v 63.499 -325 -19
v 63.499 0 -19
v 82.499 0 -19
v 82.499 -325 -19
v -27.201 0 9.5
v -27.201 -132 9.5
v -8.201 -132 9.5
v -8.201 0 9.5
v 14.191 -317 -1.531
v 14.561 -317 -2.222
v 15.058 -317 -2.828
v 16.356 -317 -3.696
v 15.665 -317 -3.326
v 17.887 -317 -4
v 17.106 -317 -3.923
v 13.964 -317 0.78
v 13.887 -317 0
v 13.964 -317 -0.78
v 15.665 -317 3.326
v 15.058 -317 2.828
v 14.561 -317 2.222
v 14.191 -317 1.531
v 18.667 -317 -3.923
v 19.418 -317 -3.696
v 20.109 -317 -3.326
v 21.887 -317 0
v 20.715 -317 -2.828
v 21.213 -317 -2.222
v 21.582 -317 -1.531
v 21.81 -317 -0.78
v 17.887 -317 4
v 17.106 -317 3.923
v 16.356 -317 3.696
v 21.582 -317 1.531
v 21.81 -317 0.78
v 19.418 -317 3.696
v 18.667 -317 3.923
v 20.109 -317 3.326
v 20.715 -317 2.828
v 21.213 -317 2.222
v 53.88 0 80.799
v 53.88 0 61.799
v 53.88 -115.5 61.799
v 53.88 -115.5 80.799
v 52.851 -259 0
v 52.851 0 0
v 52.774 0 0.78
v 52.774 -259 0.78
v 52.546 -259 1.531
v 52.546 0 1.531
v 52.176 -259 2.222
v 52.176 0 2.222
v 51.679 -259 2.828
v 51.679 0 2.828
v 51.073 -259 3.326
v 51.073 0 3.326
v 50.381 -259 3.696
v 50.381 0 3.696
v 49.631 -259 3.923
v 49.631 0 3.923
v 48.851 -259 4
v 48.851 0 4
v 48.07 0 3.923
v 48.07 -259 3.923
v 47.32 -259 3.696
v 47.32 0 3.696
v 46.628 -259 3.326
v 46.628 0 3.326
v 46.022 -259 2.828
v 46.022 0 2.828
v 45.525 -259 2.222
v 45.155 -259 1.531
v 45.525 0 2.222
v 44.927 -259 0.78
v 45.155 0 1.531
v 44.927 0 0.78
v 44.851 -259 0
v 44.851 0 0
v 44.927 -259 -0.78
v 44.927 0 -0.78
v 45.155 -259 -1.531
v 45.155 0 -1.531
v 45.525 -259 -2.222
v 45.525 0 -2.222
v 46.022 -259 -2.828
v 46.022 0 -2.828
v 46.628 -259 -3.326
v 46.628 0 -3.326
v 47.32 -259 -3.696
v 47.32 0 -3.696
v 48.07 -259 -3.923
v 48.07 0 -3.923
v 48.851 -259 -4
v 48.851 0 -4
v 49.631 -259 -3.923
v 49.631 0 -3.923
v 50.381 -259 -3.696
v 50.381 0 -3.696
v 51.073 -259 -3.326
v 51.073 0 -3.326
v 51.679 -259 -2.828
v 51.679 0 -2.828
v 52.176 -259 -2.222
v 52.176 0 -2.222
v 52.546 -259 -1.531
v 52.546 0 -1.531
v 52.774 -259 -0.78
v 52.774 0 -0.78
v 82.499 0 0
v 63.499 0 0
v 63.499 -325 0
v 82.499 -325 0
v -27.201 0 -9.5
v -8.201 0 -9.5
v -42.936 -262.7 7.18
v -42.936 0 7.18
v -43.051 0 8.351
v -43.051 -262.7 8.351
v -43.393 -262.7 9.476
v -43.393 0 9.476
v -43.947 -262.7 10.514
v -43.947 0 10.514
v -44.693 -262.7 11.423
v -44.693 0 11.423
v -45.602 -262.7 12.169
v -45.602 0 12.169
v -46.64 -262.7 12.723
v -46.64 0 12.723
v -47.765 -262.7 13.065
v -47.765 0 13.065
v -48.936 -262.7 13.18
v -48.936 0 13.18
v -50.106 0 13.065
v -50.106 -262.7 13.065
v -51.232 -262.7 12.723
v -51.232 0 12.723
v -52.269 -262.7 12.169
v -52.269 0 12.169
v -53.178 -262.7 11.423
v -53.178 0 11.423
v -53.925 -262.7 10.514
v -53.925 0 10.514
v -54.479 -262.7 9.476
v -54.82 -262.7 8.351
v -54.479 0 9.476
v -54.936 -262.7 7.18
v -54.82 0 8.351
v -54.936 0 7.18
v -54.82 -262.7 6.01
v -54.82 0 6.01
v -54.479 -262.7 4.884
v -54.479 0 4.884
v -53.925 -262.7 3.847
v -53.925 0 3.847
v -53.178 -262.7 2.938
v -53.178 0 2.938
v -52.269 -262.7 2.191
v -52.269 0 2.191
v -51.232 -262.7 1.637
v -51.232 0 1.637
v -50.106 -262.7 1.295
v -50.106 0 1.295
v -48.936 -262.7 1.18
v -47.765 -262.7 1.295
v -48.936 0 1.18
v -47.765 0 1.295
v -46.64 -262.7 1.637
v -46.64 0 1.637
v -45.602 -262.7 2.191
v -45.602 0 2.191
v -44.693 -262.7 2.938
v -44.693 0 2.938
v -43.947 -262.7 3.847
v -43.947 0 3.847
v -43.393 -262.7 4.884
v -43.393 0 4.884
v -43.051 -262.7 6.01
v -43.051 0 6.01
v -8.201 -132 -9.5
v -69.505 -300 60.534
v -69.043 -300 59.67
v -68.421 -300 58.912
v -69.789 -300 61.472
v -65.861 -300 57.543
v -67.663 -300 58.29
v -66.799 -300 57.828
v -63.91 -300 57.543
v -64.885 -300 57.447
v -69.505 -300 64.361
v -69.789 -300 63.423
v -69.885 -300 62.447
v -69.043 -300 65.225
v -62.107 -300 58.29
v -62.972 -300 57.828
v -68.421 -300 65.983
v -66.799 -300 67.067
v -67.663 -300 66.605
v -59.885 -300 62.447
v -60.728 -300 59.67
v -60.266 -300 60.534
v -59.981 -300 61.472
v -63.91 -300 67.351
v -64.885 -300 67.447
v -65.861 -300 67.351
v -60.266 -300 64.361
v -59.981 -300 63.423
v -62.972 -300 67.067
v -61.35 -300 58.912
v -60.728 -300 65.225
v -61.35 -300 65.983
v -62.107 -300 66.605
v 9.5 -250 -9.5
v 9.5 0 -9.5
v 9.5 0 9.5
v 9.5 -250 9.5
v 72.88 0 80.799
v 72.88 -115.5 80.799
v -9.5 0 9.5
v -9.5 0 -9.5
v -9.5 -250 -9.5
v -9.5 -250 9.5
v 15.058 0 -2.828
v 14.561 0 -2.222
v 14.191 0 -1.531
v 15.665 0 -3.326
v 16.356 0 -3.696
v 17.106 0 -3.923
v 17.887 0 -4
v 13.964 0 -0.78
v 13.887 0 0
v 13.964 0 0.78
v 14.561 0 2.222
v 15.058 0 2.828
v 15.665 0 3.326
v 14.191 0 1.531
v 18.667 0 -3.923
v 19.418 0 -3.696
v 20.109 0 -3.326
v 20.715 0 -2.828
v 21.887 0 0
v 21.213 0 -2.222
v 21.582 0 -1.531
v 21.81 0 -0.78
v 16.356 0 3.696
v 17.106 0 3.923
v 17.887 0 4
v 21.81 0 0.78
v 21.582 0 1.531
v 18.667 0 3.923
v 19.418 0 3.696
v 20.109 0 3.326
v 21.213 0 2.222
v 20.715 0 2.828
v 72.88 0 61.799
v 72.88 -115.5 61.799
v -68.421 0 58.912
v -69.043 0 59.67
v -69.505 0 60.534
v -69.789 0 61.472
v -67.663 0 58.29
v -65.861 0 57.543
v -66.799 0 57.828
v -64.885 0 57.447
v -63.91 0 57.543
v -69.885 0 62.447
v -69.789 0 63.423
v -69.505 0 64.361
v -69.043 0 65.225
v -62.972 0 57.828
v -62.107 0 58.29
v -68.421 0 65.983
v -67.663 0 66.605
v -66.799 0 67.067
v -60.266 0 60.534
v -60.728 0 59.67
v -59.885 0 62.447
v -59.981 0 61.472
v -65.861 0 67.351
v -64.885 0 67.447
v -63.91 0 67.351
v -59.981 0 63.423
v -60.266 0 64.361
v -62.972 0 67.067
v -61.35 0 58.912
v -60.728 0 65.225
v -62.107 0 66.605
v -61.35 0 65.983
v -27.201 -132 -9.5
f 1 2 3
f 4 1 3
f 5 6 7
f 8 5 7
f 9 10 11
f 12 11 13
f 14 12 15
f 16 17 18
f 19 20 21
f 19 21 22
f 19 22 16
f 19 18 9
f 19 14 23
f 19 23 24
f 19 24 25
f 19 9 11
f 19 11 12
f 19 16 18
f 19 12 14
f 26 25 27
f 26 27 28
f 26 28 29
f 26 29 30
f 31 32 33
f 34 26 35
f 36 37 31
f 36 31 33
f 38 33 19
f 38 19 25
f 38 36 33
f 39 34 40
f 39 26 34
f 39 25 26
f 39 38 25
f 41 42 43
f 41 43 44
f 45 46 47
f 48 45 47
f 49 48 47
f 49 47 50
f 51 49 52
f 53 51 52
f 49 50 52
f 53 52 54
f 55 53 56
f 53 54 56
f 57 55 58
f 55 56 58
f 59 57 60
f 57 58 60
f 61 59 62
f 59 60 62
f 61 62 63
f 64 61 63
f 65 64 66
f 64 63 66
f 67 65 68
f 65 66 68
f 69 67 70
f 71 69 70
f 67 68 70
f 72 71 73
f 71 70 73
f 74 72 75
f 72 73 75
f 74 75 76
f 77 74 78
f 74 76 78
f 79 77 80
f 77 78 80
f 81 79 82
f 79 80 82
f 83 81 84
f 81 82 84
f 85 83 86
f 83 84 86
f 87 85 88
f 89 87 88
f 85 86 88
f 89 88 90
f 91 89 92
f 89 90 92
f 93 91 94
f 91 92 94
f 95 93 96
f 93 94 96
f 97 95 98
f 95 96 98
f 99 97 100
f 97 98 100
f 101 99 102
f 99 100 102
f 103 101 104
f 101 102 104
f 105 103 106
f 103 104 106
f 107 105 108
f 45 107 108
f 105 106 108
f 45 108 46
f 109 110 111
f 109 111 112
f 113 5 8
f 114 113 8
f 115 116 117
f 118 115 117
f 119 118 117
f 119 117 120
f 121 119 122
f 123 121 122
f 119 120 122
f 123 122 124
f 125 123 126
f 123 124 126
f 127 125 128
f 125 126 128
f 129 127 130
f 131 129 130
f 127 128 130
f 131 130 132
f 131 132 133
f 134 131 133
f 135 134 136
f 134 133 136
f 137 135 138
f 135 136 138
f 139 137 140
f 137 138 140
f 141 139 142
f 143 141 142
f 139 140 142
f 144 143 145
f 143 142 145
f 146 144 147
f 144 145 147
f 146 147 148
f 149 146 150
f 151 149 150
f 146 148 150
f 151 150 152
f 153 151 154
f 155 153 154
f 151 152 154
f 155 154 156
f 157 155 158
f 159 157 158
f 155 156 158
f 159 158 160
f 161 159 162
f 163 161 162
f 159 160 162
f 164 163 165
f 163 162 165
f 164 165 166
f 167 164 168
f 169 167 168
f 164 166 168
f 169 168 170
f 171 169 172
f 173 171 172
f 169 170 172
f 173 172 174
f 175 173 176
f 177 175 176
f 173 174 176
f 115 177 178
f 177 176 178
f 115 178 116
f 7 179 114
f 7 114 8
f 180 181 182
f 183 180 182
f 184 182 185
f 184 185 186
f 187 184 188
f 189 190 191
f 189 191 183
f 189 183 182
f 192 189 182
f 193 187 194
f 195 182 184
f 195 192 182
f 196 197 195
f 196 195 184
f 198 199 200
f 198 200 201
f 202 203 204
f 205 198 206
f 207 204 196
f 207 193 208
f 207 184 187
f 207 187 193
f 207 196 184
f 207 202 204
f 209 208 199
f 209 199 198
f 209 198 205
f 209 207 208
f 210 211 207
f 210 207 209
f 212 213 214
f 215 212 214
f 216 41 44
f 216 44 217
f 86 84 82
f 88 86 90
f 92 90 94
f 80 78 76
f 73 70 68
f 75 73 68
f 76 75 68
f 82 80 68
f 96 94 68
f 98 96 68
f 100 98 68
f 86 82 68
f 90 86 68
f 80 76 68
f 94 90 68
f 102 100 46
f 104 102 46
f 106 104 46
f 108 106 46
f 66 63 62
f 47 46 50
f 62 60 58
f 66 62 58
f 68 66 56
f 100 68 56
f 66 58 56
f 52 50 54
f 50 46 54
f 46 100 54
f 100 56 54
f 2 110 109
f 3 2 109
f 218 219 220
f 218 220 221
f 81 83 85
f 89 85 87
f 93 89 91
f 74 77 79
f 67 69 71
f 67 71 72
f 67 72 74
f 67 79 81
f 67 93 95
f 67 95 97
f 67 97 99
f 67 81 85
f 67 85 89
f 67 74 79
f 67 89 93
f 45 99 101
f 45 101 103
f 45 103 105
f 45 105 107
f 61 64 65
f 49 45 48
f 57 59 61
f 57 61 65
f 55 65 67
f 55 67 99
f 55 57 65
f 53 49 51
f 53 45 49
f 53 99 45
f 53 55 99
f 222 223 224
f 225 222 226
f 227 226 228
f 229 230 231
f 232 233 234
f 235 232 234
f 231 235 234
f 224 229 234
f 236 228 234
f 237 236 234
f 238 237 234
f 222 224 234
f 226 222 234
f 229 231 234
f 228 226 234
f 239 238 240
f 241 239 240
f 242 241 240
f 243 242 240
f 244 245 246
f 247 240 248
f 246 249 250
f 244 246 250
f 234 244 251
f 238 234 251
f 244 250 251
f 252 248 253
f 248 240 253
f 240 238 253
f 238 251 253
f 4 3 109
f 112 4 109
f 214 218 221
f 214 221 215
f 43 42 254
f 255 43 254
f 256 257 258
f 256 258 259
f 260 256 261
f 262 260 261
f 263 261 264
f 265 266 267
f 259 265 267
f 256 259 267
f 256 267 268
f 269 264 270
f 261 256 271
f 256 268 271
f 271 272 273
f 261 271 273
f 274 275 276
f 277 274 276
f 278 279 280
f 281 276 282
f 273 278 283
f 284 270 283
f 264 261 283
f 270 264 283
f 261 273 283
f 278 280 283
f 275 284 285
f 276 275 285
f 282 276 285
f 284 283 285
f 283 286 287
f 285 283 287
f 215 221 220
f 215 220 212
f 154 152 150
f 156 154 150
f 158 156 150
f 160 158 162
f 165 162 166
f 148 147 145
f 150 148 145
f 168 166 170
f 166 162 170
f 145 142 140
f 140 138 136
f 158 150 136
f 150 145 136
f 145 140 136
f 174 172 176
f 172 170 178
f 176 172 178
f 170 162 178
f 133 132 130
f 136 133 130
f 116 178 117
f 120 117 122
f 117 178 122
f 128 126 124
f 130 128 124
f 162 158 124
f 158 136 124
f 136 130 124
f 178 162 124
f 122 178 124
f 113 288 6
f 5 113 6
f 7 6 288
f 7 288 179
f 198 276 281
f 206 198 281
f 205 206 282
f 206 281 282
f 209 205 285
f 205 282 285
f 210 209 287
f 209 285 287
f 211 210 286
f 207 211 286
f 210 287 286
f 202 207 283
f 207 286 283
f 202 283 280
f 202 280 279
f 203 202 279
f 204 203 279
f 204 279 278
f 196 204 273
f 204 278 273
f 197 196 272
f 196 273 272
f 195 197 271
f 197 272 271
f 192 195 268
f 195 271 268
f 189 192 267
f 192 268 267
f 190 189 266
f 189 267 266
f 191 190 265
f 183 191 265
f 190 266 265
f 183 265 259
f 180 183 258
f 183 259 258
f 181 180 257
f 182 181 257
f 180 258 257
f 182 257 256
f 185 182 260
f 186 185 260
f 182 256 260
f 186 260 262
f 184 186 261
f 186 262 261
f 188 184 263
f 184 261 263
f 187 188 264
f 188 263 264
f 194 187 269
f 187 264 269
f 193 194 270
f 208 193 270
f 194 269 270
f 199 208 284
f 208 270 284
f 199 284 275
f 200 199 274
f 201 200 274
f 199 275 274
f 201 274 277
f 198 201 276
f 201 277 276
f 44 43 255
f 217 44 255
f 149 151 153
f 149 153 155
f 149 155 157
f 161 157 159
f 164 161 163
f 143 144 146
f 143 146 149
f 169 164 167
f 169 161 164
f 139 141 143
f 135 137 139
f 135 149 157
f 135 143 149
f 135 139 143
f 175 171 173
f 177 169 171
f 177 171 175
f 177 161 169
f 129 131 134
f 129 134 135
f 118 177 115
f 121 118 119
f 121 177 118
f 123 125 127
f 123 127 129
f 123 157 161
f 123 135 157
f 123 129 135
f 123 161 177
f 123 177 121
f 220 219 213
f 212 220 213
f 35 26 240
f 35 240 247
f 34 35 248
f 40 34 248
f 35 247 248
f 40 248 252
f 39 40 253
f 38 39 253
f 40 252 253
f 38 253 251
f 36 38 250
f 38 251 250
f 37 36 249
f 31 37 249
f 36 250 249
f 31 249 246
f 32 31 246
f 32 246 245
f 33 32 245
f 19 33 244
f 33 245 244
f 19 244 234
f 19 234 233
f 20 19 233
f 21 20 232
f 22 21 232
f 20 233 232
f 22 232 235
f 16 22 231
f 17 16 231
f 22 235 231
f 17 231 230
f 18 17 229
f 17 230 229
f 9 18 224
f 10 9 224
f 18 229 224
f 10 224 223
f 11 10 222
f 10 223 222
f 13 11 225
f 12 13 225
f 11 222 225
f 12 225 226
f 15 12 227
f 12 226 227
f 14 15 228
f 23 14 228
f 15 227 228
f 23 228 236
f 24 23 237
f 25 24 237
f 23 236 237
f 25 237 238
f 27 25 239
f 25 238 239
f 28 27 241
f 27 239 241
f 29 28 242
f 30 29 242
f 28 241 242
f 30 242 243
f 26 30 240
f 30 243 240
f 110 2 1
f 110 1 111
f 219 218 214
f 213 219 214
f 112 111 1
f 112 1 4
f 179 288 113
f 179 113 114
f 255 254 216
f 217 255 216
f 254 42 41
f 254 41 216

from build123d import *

# Parameters (mm, degrees)
F0_W      = 19
F0_H      = 19
F1_DEPTH  = 250
F2_W      = 19
F2_H      = 19
F3_DEPTH  = 132
F4_R      = 6
F5_DEPTH  = 262.7
F6_R      = 4
F7_DEPTH  = 259
F8_W      = 19
F8_H      = 19
F9_DEPTH  = 325
F10_R     = 4
F11_DEPTH = 317
F12_R     = 5
F13_DEPTH = 300
F14_W     = 19
F14_H     = 19
F15_DEPTH = 115.5


with BuildPart() as f1:
    # F0 (on Front) → F1 (new body)
    with BuildSketch(Plane.XZ):
        Rectangle(F0_W, F0_H)
    extrude(amount=F1_DEPTH)


with BuildPart() as f3:
    # F2 (on Front) → F3 (new body)
    with BuildSketch(Plane.XZ):
        with Locations((-17.700949, 0)):
            Rectangle(F2_W, F2_H)
    extrude(amount=F3_DEPTH)


with BuildPart() as f5:
    # F4 (on Front) → F5 (new body)
    with BuildSketch(Plane.XZ):
        with Locations((-48.935786, 7.180173)):
            Circle(F4_R)
    extrude(amount=F5_DEPTH)


with BuildPart() as f7:
    # F6 (on Front) → F7 (new body)
    with BuildSketch(Plane.XZ):
        with Locations((48.850505, 0)):
            Circle(F6_R)
    extrude(amount=F7_DEPTH)


with BuildPart() as f9:
    # F8 (on Front) → F9 (new body)
    with BuildSketch(Plane.XZ):
        with Locations((72.998668, -9.5)):
            Rectangle(F8_W, F8_H)
    extrude(amount=F9_DEPTH)


with BuildPart() as f11:
    # F10 (on Front) → F11 (new body)
    with BuildSketch(Plane.XZ):
        with Locations((17.886855, 0)):
            Circle(F10_R)
    extrude(amount=F11_DEPTH)


with BuildPart() as f13:
    # F12 (on Front) → F13 (new body)
    with BuildSketch(Plane.XZ):
        with Locations((-64.885274, 62.447388)):
            Circle(F12_R)
    extrude(amount=F13_DEPTH)


with BuildPart() as f15:
    # F14 (on Front) → F15 (new body)
    with BuildSketch(Plane.XZ):
        with Locations((63.379956, 71.298807)):
            Rectangle(F14_W, F14_H)
    extrude(amount=F15_DEPTH)


solid = Compound([f1.part, f3.part, f5.part, f7.part, f9.part, f11.part, f13.part, f15.part])
